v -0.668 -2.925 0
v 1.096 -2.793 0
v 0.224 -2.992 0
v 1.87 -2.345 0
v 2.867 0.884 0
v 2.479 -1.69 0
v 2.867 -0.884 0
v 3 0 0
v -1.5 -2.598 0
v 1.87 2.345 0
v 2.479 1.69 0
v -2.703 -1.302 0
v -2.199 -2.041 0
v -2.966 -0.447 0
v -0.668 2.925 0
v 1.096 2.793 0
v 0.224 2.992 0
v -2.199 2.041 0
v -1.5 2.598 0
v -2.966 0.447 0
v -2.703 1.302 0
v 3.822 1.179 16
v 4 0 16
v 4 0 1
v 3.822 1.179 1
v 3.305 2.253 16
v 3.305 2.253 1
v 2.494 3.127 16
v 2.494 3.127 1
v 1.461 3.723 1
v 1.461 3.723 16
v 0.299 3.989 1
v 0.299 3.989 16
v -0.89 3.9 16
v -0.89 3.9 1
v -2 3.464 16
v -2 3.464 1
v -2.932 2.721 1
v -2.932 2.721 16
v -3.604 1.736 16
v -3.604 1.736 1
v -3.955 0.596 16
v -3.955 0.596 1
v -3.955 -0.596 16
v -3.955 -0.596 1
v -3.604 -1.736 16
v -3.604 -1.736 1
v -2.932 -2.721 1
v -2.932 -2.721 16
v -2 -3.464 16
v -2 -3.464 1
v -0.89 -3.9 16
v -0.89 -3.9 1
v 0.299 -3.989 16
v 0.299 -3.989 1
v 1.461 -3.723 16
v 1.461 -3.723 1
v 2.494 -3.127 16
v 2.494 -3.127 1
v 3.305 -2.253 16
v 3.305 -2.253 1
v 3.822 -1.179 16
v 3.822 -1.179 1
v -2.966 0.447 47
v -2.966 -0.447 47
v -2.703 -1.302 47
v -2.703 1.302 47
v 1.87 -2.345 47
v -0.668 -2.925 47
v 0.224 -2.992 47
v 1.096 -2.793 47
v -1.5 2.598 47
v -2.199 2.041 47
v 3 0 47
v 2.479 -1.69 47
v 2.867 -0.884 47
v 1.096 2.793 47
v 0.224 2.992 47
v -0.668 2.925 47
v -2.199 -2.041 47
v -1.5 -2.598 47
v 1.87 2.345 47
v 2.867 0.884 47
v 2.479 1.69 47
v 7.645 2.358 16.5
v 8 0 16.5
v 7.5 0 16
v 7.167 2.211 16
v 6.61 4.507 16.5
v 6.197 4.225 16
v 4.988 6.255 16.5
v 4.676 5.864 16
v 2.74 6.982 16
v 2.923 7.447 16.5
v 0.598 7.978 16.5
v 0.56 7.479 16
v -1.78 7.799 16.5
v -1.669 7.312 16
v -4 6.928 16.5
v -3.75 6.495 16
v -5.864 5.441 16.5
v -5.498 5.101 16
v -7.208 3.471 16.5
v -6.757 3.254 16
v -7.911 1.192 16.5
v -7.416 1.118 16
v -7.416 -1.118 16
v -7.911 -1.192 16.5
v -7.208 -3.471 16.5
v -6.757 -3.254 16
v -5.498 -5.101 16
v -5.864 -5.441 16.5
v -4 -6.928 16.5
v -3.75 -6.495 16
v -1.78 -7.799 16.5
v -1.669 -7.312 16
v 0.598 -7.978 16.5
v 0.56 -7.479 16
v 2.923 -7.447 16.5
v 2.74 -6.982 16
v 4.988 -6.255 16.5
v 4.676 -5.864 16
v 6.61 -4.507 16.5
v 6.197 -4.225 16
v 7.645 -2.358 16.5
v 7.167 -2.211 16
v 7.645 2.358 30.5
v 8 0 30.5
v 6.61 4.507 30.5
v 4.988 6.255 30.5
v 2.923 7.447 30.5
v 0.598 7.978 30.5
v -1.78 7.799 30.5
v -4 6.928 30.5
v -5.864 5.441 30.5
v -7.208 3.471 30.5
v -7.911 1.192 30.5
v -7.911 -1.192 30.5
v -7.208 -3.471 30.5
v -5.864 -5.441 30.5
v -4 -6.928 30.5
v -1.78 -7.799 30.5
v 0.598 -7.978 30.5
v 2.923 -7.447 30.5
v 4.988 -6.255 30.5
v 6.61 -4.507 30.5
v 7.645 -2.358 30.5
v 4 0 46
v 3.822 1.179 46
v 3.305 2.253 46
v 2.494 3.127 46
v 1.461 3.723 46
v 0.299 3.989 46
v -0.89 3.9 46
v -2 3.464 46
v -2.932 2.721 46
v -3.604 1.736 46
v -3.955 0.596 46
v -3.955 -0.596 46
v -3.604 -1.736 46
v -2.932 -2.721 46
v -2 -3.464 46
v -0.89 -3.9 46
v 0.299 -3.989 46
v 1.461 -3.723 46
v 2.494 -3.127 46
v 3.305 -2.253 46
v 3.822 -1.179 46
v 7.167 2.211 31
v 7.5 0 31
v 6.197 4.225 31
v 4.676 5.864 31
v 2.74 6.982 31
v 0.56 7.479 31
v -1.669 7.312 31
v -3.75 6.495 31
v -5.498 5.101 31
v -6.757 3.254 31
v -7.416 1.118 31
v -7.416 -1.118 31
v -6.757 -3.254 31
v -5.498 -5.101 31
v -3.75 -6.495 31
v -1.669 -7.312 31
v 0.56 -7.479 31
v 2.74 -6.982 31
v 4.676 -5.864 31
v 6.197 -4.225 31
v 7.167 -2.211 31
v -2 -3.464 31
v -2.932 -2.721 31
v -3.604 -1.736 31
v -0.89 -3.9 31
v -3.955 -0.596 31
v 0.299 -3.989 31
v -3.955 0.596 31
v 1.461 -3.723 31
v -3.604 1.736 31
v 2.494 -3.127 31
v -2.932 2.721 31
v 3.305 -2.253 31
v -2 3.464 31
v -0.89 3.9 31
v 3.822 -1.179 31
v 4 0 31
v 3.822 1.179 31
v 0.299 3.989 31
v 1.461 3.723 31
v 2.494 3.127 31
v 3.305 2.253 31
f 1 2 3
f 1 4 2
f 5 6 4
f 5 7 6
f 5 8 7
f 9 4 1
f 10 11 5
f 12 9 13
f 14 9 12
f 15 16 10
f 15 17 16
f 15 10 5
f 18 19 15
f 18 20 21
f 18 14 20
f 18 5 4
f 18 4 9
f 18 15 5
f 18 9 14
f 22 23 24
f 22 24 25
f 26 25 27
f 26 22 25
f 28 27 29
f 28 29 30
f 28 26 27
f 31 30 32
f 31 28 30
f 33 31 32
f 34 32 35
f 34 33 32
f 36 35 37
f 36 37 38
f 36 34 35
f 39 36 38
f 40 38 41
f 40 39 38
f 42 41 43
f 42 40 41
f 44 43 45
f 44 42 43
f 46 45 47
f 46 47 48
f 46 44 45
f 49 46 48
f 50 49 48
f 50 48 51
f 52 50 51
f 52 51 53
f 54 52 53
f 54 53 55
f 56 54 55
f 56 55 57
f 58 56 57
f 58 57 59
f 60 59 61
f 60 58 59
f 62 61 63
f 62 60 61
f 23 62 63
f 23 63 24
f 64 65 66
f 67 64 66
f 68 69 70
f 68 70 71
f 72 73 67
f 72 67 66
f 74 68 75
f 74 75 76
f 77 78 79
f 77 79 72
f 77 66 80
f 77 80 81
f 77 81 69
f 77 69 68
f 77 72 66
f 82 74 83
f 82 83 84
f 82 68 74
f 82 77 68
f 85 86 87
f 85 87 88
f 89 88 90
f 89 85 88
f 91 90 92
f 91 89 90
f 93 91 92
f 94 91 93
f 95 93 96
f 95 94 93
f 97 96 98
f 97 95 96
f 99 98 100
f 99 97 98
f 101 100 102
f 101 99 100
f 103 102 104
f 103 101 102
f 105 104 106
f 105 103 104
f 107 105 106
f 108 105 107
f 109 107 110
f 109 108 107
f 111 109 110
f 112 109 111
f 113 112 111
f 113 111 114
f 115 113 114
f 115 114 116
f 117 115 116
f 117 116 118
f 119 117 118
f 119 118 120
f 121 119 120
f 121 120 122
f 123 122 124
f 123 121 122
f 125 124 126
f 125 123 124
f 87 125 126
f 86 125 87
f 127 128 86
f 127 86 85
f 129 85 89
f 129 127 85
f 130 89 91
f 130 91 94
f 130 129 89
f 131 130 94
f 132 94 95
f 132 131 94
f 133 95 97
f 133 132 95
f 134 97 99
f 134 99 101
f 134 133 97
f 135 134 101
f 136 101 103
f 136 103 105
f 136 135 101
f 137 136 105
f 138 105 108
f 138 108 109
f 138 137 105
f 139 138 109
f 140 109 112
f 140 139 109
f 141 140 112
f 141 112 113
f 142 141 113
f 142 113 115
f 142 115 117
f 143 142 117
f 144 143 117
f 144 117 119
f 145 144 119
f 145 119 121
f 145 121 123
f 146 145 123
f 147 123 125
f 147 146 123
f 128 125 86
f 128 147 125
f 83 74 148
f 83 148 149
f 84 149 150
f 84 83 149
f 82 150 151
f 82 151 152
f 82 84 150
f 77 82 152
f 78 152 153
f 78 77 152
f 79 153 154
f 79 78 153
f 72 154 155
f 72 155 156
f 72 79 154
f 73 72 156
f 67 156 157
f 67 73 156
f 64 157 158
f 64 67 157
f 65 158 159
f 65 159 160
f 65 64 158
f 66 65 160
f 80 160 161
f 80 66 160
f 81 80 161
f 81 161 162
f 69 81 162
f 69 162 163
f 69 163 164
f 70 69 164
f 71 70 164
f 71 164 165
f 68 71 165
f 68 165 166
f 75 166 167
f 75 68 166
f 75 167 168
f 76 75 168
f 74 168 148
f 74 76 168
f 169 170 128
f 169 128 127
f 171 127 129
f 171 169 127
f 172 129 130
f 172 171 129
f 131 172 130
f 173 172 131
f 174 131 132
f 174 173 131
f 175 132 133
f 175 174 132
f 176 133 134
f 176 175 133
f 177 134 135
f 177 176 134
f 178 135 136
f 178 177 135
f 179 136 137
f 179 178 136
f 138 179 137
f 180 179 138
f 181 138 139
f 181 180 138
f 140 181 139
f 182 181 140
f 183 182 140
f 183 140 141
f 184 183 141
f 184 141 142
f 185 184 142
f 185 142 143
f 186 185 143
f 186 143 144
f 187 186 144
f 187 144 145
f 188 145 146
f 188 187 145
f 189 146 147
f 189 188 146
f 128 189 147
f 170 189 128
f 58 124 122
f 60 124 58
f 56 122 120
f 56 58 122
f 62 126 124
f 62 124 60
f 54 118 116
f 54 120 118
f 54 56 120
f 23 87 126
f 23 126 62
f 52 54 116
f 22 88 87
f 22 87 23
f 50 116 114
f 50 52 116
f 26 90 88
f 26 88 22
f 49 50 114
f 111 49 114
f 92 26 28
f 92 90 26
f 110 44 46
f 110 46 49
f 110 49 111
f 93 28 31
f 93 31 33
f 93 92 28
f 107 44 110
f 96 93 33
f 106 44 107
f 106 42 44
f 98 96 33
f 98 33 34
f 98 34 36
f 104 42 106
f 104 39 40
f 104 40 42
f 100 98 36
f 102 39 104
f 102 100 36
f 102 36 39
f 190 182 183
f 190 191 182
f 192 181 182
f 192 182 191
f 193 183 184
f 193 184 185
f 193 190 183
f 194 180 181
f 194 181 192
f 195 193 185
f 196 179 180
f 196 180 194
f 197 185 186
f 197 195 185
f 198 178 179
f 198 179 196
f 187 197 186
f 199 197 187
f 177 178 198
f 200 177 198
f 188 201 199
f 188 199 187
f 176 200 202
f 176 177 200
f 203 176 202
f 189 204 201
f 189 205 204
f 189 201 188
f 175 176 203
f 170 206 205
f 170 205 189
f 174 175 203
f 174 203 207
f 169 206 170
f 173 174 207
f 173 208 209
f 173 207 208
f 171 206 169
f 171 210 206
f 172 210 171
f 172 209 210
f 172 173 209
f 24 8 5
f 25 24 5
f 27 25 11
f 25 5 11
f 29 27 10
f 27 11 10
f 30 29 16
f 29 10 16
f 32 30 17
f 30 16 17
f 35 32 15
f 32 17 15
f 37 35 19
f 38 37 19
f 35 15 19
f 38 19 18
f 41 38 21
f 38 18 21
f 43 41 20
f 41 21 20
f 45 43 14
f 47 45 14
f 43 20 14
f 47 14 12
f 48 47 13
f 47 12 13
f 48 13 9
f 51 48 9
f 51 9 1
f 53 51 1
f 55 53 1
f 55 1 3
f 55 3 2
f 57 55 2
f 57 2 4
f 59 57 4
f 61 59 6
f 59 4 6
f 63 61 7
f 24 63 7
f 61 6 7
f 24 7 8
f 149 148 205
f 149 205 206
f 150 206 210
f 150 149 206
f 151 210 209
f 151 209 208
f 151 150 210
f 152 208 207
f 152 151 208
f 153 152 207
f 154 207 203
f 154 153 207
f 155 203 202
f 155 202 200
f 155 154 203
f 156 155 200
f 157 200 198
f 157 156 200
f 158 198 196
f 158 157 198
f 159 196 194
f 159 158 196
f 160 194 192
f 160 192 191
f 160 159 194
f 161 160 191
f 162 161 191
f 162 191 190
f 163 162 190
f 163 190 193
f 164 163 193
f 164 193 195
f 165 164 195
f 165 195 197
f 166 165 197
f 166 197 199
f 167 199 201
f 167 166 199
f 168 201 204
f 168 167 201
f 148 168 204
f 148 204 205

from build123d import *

# Parameters (mm, degrees)
F2_SIZE = 0.5
F3_SIZE = 1


with BuildPart() as f1:
    # F0 (on Front) → F1 (revolve)
    with BuildSketch(Plane.XZ):
        Polygon((0, 47), (0, 0), (4, 0), (4, 16), (8, 16), (8, 31), (4, 31), (4, 47), align=None)
    revolve(axis=Axis((0, 0, 23.5), (0, 0, 1)))

    # F2
    f2_edges = [f1.edges().sort_by_distance(p)[0] for p in [
        (-8, 0, 31),
        (-8, 0, 16),
    ]]
    chamfer(f2_edges, length=F2_SIZE)

    # F3
    f3_edges = [f1.edges().sort_by_distance(p)[0] for p in [
        (-4, 0, 47),
        (-4, 0, 0),
    ]]
    chamfer(f3_edges, length=F3_SIZE)


solid = f1.part
